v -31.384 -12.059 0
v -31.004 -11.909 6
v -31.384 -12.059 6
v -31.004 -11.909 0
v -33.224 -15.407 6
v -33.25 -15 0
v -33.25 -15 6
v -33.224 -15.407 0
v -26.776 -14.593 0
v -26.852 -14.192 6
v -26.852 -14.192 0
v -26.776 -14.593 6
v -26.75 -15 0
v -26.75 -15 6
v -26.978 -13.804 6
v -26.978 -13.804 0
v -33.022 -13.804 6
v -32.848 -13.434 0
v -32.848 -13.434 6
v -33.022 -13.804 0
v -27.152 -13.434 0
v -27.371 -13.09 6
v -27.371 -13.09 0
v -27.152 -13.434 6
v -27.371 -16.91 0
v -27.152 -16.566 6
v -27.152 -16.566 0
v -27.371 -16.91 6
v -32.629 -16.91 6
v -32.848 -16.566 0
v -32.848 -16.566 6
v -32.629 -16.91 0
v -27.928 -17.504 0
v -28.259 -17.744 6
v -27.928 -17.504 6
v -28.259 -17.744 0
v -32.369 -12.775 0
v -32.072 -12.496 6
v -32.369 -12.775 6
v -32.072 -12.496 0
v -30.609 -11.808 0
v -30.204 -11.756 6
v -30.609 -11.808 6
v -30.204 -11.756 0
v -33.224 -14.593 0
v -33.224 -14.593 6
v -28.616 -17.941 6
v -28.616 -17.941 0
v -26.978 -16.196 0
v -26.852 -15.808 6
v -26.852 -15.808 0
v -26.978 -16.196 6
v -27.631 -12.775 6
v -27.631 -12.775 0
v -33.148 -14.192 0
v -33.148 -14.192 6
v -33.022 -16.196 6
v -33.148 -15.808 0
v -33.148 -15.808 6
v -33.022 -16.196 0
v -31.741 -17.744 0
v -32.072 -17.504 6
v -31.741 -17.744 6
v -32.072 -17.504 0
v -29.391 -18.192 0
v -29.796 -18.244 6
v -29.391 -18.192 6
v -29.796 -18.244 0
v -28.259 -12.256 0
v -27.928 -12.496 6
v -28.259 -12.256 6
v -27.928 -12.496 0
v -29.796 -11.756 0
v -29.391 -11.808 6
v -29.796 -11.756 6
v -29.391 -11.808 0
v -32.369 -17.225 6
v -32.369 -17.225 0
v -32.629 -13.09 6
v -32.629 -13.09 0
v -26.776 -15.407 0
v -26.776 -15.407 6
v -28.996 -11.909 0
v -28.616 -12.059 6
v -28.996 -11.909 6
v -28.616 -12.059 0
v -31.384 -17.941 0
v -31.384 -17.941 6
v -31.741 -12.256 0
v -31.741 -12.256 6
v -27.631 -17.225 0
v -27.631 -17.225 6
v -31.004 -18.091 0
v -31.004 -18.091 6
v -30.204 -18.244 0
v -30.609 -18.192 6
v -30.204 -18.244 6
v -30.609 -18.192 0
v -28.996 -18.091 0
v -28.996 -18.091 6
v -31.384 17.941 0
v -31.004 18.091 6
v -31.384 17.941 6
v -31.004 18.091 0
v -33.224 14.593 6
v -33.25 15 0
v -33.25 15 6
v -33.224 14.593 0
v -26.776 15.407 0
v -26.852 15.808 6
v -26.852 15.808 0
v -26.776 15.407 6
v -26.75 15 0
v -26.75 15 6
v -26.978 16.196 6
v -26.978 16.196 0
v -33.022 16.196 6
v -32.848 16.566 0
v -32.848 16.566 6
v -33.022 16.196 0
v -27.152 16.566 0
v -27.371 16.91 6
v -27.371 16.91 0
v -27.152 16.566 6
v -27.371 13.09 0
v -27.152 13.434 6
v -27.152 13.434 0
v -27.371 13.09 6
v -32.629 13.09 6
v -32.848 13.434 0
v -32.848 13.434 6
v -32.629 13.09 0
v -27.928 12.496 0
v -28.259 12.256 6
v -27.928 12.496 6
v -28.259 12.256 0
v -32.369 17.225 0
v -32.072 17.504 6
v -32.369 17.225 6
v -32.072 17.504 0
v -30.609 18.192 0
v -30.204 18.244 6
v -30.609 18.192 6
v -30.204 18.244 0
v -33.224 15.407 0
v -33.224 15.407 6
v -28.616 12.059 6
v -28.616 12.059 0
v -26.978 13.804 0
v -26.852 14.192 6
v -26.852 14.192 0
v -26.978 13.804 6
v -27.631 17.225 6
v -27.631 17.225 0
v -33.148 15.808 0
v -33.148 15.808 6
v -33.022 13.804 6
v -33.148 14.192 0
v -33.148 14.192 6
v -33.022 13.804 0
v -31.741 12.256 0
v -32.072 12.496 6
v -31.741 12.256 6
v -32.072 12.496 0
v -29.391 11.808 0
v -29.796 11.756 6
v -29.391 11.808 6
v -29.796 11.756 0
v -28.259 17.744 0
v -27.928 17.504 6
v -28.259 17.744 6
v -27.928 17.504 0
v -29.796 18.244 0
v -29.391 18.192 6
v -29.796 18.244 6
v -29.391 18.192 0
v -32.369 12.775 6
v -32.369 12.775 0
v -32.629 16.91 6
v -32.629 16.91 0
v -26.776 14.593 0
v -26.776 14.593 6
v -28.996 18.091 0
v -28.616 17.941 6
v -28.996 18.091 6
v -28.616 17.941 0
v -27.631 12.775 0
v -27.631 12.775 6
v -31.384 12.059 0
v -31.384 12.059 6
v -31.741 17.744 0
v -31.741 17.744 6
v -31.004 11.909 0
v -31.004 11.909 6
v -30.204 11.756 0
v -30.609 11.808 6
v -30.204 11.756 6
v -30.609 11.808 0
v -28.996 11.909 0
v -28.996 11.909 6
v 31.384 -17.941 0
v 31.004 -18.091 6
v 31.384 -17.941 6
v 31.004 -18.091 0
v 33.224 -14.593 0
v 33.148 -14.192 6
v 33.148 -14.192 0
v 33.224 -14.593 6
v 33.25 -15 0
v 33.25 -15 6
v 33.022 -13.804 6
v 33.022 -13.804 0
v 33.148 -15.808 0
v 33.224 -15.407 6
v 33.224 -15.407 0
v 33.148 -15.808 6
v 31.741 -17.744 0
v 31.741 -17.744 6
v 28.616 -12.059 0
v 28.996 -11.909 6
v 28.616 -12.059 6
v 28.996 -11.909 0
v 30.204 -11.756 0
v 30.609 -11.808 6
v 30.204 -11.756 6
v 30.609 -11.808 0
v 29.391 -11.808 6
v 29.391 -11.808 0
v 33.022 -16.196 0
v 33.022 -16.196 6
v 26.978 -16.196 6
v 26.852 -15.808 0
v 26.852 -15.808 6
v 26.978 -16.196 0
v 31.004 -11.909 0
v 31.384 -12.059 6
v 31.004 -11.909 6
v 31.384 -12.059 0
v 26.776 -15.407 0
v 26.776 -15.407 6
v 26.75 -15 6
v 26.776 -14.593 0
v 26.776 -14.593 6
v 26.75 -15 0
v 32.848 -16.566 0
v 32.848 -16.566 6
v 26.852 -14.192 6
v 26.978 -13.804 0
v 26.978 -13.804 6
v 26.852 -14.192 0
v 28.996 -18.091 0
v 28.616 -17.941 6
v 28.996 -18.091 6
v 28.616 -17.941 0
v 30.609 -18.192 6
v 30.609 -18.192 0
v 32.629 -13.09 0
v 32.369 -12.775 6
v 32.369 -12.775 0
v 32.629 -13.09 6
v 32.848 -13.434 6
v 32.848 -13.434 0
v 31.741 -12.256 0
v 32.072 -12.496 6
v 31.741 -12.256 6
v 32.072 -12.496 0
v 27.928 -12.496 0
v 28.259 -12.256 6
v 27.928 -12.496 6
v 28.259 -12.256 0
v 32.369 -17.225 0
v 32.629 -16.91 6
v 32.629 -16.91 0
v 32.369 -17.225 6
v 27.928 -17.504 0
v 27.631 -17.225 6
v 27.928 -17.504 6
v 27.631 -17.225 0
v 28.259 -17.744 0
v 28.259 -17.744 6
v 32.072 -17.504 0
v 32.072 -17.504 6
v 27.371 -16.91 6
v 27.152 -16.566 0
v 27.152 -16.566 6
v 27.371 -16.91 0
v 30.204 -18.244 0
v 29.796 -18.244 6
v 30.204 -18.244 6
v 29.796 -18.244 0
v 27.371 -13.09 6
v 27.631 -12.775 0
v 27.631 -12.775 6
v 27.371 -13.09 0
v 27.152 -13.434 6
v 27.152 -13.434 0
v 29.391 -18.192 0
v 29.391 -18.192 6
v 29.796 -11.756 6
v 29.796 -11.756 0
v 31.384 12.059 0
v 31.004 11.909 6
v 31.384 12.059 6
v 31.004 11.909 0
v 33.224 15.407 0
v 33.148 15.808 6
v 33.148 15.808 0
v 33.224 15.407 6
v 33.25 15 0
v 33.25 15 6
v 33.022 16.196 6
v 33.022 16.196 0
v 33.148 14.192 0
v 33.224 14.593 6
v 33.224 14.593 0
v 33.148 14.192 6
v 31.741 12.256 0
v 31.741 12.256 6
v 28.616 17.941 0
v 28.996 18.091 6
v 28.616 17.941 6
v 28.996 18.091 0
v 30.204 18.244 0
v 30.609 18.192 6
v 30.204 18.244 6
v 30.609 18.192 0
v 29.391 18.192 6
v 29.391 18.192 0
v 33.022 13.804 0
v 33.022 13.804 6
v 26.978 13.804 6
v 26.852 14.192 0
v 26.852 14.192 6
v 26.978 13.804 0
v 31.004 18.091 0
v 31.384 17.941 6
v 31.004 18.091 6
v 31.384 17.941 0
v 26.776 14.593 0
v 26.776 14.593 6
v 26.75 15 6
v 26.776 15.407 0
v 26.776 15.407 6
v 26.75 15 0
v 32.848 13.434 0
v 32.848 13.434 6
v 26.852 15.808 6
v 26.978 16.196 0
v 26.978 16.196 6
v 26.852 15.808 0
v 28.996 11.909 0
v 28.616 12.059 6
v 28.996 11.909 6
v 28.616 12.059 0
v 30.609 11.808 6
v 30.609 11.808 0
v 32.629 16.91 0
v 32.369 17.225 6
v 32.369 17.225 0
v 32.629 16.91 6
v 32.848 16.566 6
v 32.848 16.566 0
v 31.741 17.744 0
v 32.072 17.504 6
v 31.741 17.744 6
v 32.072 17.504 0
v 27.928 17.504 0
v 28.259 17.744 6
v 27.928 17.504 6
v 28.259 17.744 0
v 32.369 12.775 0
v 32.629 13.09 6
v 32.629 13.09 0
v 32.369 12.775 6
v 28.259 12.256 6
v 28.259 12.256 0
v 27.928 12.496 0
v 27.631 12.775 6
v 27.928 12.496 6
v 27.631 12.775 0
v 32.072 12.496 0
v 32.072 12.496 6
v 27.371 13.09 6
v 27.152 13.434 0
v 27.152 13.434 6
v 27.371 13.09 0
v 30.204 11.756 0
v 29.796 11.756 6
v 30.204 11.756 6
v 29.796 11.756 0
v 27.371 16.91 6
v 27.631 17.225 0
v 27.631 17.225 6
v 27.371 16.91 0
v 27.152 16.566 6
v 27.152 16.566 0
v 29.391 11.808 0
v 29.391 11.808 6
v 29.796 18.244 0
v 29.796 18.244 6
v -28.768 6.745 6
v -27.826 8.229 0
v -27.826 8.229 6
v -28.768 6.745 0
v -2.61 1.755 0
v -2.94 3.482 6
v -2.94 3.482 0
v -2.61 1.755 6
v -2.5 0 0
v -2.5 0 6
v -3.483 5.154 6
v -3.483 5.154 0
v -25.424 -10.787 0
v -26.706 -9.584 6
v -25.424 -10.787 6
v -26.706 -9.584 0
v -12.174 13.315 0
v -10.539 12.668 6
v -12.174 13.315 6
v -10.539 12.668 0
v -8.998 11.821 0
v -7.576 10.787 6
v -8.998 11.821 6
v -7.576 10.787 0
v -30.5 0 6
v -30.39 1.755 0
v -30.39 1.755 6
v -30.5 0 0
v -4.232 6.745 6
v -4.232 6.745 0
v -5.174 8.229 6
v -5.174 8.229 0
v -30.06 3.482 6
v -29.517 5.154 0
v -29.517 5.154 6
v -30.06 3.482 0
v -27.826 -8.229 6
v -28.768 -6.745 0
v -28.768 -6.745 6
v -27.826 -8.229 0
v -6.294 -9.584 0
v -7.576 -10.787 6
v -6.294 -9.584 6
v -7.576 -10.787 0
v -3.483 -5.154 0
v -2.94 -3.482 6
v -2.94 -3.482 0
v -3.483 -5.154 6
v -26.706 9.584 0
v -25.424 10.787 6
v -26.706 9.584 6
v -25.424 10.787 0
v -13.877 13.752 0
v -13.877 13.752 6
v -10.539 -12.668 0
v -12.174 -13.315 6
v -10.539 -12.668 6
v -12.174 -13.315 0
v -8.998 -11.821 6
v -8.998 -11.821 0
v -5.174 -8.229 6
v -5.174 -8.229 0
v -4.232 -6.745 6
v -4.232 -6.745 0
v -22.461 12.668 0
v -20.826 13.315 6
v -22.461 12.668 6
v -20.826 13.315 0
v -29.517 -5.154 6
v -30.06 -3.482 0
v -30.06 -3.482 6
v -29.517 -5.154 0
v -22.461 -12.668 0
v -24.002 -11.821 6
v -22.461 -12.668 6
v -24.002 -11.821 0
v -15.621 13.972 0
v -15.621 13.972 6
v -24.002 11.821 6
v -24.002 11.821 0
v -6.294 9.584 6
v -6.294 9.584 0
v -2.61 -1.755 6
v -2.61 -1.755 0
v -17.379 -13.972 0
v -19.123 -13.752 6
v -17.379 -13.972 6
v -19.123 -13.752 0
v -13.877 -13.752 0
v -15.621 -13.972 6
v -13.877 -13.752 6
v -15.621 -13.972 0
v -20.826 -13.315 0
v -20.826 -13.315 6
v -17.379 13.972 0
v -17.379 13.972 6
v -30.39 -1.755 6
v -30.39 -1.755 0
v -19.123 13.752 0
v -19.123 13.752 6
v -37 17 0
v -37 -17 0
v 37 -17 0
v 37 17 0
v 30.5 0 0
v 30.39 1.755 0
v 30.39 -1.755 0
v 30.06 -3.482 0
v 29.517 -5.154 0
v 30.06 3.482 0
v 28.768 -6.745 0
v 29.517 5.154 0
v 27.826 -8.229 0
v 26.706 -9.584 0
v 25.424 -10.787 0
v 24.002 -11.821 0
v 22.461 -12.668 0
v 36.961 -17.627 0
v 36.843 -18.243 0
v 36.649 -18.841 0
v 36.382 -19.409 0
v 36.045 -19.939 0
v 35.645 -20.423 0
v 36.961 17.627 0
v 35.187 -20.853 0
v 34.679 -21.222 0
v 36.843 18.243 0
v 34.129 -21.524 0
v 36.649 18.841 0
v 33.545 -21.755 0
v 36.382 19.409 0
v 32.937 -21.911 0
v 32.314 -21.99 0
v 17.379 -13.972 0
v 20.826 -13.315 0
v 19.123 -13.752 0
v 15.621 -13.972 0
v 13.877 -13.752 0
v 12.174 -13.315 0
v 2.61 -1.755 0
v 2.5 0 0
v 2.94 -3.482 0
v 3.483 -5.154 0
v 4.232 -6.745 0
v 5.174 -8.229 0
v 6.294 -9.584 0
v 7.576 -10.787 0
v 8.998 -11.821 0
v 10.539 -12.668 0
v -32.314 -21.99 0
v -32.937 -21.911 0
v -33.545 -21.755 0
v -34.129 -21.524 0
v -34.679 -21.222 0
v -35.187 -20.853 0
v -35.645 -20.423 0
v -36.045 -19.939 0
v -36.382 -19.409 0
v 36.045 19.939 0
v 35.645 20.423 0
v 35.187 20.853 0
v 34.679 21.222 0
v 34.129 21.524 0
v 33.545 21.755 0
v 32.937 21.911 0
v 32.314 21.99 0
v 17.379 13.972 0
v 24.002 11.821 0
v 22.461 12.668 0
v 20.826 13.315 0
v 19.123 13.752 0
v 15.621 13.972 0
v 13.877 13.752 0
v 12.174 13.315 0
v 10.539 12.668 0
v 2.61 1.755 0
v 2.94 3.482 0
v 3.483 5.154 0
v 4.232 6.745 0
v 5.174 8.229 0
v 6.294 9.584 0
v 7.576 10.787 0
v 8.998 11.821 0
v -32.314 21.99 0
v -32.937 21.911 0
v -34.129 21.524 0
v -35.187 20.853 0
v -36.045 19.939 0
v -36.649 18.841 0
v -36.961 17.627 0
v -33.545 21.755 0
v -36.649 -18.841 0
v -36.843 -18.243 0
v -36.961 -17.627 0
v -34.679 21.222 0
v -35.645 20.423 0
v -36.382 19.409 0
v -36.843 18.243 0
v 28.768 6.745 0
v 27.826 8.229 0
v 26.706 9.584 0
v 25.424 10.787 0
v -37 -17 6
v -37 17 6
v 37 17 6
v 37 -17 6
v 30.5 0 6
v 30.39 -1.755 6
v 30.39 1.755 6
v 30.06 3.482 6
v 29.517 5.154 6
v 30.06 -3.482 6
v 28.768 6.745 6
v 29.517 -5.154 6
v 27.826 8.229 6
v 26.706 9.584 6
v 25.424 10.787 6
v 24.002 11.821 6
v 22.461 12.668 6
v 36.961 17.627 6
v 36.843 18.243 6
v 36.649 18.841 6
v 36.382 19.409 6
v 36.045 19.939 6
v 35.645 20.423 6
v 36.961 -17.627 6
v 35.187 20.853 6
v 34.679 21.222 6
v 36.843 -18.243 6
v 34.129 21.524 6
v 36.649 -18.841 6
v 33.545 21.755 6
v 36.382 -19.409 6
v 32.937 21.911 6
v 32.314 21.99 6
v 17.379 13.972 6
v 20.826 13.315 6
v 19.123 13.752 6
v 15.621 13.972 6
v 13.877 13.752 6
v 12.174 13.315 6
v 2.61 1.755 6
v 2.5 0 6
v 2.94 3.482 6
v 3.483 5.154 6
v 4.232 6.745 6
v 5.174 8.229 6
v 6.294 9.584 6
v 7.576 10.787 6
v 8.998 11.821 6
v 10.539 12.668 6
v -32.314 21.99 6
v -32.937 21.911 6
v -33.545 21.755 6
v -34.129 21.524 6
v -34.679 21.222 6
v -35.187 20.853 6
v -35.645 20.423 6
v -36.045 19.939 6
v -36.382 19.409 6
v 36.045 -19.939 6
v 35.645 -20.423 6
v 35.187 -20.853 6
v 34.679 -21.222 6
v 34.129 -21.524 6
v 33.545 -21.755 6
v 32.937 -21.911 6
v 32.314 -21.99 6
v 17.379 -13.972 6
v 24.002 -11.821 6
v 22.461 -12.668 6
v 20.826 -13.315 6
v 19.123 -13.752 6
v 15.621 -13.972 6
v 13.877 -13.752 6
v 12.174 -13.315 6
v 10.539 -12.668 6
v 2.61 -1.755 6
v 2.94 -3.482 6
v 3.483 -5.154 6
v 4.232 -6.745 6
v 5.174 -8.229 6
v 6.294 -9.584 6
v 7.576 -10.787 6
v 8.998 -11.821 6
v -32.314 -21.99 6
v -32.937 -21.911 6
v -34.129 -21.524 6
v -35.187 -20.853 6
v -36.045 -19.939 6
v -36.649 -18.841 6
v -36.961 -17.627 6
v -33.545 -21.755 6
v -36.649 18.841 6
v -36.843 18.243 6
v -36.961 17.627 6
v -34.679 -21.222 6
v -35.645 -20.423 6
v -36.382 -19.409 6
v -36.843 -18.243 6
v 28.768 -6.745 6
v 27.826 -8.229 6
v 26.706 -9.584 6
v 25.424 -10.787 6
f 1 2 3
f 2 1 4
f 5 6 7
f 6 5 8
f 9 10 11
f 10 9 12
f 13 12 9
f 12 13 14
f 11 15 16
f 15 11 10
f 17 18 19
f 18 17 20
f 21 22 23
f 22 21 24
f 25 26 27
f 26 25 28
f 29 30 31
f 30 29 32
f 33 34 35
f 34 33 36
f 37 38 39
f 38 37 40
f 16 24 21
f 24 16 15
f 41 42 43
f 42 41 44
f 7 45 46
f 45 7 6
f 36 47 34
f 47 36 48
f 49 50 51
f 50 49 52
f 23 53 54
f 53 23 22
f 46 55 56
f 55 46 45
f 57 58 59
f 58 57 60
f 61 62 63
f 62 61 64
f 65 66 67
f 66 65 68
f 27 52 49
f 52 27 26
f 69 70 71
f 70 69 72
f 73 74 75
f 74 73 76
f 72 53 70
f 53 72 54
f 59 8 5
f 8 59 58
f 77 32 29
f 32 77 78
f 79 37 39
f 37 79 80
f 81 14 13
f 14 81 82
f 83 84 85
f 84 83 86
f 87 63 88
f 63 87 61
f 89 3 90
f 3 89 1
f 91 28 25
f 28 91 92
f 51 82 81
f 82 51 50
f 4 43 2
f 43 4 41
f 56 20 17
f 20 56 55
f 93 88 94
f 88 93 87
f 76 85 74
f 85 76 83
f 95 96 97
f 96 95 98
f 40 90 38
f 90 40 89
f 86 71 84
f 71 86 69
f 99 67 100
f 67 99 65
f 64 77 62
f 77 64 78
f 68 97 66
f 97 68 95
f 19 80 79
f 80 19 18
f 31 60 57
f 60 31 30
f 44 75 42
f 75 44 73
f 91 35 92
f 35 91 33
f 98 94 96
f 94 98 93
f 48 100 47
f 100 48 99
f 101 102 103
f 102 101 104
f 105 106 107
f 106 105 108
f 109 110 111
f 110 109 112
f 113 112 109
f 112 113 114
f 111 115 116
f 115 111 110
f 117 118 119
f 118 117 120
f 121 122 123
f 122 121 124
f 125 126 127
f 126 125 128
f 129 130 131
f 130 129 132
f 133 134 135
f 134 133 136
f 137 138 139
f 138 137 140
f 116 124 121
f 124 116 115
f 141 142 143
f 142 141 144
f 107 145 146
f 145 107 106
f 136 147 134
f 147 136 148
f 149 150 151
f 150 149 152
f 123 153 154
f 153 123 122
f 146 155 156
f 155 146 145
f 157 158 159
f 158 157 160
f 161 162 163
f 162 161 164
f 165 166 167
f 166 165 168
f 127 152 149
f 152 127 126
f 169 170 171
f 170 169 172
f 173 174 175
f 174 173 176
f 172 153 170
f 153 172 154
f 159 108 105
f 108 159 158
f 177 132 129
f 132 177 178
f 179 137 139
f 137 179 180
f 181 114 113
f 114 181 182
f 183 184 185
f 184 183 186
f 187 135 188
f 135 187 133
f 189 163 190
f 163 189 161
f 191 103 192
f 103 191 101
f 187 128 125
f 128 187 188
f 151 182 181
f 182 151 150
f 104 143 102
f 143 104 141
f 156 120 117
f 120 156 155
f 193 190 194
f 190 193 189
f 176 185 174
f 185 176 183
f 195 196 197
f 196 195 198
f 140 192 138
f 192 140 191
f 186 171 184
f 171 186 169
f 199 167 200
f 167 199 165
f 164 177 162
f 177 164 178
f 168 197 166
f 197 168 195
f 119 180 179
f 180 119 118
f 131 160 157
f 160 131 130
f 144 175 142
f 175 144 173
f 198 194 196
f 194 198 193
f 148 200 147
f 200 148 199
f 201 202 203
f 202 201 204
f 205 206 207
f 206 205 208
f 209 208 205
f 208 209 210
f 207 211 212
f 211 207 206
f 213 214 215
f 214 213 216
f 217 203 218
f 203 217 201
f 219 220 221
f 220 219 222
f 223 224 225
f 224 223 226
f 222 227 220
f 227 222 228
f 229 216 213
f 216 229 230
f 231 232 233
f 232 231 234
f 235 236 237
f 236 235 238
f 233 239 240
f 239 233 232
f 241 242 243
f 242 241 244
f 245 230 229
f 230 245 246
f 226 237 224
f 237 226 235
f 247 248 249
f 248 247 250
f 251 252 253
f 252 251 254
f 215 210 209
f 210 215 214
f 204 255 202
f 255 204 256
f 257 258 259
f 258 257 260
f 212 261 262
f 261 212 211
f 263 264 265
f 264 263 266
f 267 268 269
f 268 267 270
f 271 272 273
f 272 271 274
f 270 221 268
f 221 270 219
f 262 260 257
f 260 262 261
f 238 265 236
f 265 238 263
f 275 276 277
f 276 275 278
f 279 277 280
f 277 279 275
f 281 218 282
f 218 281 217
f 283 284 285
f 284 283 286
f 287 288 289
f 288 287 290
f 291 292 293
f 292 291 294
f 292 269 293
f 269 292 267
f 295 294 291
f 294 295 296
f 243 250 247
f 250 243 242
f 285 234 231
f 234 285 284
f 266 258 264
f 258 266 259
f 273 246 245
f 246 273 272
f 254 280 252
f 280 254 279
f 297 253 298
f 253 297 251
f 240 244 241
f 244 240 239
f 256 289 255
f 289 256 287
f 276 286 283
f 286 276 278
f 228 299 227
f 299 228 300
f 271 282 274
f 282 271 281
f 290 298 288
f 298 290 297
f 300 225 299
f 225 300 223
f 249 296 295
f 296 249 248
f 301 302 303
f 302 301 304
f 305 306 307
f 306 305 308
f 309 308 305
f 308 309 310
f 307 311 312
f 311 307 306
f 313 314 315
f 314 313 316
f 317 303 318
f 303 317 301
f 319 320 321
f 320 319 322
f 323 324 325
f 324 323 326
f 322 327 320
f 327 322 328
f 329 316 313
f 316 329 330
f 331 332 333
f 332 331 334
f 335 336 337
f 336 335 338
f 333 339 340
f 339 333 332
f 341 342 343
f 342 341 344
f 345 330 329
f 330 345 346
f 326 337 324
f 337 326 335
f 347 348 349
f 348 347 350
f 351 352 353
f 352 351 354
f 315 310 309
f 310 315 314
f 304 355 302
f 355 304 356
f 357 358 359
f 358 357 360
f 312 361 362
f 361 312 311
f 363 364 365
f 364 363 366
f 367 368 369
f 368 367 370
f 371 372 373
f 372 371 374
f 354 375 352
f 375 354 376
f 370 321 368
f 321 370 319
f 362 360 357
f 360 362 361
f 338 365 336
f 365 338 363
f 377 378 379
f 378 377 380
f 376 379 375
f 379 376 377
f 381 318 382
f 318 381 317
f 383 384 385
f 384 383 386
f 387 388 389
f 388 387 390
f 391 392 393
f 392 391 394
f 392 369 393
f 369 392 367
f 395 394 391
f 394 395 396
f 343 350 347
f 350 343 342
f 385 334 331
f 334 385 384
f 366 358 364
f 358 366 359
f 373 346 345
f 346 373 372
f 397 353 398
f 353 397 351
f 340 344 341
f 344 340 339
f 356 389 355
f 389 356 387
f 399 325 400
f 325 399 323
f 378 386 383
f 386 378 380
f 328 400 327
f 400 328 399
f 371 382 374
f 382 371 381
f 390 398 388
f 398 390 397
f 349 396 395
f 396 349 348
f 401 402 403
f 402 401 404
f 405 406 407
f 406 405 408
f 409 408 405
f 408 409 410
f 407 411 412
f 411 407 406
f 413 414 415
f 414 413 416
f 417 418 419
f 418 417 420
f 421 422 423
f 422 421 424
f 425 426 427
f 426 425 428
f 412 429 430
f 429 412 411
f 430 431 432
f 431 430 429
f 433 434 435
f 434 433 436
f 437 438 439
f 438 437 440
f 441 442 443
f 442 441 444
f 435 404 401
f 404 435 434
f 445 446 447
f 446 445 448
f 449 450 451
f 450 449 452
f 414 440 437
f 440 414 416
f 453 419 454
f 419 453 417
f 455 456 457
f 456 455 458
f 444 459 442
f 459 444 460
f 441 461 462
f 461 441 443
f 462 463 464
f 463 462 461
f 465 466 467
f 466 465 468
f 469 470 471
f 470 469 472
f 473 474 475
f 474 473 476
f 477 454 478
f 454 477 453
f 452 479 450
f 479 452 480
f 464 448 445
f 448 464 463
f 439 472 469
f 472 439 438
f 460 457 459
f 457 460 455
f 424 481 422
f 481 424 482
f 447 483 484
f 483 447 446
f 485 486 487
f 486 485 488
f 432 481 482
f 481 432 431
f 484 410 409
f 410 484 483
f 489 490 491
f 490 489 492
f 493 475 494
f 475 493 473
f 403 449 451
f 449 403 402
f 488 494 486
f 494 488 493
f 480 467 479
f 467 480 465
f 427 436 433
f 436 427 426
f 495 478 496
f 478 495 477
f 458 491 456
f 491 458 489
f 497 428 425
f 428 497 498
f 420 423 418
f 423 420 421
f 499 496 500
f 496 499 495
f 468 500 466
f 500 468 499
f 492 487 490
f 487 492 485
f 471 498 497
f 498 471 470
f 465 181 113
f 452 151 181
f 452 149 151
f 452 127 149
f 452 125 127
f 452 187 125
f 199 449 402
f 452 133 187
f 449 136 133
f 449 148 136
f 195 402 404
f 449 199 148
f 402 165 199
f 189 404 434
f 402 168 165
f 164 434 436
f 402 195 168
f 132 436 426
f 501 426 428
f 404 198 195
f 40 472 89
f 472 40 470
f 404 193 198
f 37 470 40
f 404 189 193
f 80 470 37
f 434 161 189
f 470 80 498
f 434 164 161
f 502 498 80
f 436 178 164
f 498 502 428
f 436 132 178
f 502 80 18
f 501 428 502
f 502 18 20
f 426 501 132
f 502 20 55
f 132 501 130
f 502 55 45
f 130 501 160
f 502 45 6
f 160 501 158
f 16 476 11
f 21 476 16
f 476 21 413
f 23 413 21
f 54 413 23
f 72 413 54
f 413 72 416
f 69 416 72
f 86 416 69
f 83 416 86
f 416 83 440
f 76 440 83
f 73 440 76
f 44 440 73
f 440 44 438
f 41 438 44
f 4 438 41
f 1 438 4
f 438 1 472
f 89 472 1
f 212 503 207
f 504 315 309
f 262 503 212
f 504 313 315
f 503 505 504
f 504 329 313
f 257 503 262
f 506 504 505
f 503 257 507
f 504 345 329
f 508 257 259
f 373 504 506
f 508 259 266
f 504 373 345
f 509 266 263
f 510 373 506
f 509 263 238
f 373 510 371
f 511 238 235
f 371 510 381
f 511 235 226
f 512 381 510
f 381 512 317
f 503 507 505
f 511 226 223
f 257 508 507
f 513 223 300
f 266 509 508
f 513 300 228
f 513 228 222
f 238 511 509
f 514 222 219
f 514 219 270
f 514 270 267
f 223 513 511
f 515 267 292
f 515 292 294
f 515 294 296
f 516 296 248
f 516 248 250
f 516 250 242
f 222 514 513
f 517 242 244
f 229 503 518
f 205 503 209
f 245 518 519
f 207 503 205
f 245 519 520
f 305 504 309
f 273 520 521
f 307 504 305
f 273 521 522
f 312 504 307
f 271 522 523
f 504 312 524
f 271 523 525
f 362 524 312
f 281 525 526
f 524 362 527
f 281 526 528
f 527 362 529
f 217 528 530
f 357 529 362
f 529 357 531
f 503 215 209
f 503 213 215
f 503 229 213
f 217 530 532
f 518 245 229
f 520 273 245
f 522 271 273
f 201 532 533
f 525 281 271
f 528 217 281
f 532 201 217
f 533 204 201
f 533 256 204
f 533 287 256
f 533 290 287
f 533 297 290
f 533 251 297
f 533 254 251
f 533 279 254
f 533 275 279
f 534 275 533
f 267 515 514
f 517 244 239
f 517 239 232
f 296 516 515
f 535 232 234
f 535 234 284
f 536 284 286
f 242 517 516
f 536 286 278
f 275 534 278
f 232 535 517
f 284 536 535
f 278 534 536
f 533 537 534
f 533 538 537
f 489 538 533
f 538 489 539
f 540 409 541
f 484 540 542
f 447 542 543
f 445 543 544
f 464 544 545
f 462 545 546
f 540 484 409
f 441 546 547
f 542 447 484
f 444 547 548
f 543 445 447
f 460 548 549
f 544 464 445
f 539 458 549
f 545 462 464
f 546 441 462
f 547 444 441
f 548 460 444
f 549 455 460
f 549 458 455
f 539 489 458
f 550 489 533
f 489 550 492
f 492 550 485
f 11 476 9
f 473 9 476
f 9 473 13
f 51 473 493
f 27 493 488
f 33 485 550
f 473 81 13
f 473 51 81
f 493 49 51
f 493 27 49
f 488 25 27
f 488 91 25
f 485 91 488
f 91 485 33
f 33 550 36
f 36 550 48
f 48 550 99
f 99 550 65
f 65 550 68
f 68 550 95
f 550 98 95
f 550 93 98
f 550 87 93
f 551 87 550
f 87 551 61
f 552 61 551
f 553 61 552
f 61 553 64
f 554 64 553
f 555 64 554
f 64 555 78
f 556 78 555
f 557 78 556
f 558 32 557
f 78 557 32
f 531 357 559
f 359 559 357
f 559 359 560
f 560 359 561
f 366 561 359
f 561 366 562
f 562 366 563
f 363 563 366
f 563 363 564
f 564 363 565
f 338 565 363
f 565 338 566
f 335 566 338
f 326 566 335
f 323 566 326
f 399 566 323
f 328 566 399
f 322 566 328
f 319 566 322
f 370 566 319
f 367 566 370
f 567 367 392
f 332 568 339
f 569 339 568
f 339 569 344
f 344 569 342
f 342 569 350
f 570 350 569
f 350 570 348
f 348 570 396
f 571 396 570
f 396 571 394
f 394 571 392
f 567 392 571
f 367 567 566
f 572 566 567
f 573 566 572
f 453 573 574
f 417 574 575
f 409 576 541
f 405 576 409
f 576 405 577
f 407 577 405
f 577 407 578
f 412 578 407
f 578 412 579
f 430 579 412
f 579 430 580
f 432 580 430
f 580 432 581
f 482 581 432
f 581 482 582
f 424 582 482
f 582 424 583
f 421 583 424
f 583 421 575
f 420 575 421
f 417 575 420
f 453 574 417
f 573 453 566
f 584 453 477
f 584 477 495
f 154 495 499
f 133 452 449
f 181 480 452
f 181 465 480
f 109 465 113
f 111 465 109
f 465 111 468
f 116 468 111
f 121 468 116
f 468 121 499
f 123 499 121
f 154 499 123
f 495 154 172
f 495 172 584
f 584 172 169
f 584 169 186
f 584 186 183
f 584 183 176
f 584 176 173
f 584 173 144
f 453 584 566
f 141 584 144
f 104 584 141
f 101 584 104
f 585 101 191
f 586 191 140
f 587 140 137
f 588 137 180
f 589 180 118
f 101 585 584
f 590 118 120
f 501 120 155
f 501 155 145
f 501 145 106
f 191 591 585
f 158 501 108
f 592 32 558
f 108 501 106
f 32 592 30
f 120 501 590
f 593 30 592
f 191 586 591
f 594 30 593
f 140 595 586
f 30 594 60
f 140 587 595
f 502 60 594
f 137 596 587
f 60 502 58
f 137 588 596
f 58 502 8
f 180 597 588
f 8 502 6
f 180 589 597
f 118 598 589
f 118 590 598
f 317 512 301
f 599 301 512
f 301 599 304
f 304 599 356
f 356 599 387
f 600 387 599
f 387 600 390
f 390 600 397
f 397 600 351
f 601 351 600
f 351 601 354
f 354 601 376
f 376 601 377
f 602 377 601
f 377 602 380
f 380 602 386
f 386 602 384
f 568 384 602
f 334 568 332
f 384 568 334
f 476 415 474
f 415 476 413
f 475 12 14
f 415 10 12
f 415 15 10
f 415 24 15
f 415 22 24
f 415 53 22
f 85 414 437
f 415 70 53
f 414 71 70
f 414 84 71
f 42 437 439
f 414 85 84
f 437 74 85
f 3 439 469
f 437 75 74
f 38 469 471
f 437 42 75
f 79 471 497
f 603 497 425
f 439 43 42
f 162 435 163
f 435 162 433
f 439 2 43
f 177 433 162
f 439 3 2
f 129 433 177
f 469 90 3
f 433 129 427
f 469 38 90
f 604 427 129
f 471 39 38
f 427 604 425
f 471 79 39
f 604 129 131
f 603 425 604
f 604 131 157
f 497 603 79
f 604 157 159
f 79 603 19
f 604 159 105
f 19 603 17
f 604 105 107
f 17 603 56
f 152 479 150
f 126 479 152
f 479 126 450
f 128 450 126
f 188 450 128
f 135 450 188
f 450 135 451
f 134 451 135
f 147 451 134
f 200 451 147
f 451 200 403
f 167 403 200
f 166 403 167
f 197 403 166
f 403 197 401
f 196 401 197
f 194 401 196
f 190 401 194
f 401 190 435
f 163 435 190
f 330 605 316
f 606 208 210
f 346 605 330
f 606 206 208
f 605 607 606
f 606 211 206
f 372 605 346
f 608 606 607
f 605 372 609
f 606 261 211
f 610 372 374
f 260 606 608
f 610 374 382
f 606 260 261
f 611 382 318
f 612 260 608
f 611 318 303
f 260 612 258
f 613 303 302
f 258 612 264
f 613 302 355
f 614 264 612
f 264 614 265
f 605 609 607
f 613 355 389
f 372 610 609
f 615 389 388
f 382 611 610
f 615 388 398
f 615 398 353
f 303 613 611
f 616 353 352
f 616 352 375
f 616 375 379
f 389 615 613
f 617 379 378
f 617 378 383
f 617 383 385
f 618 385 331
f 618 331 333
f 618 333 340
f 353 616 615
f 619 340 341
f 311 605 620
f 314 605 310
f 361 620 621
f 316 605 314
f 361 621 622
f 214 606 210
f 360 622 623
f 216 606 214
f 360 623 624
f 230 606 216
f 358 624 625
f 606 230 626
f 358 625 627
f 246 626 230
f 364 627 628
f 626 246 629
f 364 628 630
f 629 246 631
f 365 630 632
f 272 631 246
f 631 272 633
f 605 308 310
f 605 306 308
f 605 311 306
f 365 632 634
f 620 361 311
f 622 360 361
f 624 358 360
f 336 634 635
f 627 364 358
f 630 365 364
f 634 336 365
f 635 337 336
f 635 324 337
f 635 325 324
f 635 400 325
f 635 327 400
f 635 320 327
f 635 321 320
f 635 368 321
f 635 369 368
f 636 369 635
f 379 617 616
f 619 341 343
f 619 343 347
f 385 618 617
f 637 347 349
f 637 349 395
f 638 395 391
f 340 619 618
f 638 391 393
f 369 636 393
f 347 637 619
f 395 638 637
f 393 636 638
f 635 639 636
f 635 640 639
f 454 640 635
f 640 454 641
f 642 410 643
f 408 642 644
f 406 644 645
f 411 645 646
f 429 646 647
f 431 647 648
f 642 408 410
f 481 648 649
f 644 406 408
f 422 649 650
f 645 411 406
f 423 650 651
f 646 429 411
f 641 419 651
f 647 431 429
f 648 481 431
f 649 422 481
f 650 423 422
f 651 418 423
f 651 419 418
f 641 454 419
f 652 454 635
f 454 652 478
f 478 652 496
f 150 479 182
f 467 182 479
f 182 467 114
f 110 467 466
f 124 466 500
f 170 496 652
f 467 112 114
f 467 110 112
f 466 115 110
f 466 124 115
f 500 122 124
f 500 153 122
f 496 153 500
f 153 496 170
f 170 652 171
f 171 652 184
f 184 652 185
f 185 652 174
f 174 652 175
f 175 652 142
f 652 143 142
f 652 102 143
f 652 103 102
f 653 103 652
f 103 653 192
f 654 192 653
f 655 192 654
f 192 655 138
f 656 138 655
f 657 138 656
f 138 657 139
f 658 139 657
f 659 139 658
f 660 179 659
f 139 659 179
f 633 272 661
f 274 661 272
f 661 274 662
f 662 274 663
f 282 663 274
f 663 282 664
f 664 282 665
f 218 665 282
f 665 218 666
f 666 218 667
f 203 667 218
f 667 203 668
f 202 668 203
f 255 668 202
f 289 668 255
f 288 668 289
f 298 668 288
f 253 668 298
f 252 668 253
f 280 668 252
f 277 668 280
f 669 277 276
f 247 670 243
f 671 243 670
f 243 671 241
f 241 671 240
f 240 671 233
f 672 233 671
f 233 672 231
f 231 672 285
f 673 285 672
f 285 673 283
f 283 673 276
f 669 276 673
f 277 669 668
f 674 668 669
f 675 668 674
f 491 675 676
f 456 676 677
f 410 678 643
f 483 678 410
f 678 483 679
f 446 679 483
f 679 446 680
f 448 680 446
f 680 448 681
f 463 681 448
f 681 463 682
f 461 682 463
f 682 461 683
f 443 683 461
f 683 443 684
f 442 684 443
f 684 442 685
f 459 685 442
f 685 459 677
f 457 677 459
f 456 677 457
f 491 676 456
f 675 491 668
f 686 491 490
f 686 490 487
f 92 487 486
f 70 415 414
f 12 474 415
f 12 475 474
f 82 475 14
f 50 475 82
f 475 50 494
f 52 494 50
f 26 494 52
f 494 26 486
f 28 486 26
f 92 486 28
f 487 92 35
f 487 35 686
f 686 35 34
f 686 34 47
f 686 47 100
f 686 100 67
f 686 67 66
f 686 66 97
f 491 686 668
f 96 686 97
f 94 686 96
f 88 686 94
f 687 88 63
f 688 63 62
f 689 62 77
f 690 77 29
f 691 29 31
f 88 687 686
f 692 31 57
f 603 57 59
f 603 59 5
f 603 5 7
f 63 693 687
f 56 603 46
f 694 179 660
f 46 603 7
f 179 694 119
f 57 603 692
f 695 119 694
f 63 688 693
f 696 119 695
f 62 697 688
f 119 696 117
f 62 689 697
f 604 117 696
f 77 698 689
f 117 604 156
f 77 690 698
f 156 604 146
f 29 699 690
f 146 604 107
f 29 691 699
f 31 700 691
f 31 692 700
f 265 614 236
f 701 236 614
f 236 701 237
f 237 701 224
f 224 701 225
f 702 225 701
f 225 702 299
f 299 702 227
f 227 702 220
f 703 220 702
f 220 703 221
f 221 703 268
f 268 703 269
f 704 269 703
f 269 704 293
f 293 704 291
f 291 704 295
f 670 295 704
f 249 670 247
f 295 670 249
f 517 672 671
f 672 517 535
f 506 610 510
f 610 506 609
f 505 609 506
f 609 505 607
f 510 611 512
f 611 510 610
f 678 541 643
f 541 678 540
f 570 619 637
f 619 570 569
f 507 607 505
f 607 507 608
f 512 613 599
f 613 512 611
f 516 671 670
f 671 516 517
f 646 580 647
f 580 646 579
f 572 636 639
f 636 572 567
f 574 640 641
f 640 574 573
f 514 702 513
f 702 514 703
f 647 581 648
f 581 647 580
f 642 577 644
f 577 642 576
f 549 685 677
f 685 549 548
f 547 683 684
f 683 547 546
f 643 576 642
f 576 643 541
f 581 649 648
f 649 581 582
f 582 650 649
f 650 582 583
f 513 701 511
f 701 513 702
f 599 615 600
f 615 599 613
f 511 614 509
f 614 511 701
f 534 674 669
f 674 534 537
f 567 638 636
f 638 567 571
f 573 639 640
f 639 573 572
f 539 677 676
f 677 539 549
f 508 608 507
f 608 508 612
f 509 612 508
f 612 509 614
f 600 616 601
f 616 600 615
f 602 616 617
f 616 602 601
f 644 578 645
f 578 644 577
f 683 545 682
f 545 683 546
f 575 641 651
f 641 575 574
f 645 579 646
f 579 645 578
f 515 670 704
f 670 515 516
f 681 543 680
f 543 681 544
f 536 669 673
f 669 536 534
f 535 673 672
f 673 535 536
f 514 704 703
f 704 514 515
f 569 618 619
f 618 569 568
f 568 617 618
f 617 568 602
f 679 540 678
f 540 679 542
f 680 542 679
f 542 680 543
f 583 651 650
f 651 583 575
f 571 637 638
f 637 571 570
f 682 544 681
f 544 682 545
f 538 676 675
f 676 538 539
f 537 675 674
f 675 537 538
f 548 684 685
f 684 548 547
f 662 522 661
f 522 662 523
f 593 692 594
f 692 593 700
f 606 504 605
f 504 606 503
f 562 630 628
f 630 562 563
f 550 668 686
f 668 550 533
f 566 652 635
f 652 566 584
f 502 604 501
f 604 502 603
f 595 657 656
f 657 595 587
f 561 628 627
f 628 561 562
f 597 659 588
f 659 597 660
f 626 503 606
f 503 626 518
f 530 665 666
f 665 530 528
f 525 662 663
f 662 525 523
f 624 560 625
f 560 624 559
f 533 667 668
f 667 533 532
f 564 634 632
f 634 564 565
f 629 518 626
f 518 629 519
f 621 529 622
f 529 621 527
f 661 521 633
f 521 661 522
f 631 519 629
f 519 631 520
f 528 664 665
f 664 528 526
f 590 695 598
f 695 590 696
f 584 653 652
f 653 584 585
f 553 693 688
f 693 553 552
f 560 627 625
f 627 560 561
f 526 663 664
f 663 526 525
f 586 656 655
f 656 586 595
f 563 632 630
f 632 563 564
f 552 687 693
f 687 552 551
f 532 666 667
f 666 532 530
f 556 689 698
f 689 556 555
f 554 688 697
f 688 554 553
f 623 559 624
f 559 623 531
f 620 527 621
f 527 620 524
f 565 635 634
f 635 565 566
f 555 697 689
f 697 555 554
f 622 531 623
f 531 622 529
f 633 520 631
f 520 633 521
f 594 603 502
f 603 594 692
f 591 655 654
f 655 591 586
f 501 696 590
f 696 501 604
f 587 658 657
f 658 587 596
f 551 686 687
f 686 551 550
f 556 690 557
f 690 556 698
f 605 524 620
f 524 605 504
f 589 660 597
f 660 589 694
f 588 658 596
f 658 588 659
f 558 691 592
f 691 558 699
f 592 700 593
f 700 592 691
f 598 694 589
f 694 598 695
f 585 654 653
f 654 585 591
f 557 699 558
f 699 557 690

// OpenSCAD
$fn = 50;

difference() {
	union() {
		hull() {
			translate(v = [-32.0, 17.0, 0]) {
				cylinder(h = 6, r = 5);
			}
			translate(v = [32.0, 17.0, 0]) {
				cylinder(h = 6, r = 5);
			}
			translate(v = [-32.0, -17.0, 0]) {
				cylinder(h = 6, r = 5);
			}
			translate(v = [32.0, -17.0, 0]) {
				cylinder(h = 6, r = 5);
			}
		}
	}
	union() {
		translate(v = [-30.0, -15.0, -100.0]) {
			cylinder(h = 200, r = 3.25);
		}
		translate(v = [-30.0, 15.0, -100.0]) {
			cylinder(h = 200, r = 3.25);
		}
		translate(v = [30.0, -15.0, -100.0]) {
			cylinder(h = 200, r = 3.25);
		}
		translate(v = [30.0, 15.0, -100.0]) {
			cylinder(h = 200, r = 3.25);
		}
		translate(v = [-30.0, -15.0, -100.0]) {
			cylinder(h = 200, r = 1.8);
		}
		translate(v = [-30.0, 15.0, -100.0]) {
			cylinder(h = 200, r = 1.8);
		}
		translate(v = [30.0, -15.0, -100.0]) {
			cylinder(h = 200, r = 1.8);
		}
		translate(v = [30.0, 15.0, -100.0]) {
			cylinder(h = 200, r = 1.8);
		}
		translate(v = [-16.5, 0, 0.0]) {
			cylinder(h = 6, r = 14.0);
		}
		translate(v = [16.5, 0, 0.0]) {
			cylinder(h = 6, r = 14.0);
		}
	}
}
